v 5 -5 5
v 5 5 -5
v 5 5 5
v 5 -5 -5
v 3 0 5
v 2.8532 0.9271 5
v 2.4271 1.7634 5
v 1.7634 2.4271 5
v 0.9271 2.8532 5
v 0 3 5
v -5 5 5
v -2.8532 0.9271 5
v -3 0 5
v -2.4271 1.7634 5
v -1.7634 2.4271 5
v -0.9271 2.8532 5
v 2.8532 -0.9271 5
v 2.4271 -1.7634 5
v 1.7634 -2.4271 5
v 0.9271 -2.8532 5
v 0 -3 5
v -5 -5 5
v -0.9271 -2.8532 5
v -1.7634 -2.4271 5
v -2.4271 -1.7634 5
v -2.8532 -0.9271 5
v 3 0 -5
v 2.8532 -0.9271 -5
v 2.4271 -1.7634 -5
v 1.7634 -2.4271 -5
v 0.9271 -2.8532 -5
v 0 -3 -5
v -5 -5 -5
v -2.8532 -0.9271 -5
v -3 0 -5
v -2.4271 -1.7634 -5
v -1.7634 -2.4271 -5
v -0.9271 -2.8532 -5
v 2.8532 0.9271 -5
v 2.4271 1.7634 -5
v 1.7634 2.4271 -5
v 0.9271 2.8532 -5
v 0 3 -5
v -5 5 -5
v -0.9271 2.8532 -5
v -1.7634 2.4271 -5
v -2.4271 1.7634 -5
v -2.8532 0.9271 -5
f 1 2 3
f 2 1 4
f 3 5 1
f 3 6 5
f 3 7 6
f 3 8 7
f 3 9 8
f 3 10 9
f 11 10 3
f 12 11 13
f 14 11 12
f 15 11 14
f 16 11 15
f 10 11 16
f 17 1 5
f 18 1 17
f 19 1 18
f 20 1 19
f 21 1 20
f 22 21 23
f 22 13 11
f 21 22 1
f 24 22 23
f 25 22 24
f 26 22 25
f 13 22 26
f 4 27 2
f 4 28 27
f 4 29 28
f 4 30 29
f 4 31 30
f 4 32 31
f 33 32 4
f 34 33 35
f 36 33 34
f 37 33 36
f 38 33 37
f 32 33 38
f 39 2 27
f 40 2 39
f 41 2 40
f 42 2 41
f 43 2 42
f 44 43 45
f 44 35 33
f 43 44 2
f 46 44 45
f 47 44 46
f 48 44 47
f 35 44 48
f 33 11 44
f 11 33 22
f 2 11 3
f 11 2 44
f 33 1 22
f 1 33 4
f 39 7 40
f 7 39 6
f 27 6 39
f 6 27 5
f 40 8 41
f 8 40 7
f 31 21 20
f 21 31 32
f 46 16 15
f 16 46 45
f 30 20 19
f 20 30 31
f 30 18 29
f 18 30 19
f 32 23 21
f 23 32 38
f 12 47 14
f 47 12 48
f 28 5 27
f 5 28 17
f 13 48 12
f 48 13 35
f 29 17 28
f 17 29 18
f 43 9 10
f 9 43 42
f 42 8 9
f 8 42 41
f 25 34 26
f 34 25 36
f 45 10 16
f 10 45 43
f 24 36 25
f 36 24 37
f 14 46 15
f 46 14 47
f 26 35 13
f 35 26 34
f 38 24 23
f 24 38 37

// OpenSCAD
// cube with a through hole
difference() {
  cube(10, center = true);
  cylinder(h = 12, r = 3, center = true, $fn = 20);
}
